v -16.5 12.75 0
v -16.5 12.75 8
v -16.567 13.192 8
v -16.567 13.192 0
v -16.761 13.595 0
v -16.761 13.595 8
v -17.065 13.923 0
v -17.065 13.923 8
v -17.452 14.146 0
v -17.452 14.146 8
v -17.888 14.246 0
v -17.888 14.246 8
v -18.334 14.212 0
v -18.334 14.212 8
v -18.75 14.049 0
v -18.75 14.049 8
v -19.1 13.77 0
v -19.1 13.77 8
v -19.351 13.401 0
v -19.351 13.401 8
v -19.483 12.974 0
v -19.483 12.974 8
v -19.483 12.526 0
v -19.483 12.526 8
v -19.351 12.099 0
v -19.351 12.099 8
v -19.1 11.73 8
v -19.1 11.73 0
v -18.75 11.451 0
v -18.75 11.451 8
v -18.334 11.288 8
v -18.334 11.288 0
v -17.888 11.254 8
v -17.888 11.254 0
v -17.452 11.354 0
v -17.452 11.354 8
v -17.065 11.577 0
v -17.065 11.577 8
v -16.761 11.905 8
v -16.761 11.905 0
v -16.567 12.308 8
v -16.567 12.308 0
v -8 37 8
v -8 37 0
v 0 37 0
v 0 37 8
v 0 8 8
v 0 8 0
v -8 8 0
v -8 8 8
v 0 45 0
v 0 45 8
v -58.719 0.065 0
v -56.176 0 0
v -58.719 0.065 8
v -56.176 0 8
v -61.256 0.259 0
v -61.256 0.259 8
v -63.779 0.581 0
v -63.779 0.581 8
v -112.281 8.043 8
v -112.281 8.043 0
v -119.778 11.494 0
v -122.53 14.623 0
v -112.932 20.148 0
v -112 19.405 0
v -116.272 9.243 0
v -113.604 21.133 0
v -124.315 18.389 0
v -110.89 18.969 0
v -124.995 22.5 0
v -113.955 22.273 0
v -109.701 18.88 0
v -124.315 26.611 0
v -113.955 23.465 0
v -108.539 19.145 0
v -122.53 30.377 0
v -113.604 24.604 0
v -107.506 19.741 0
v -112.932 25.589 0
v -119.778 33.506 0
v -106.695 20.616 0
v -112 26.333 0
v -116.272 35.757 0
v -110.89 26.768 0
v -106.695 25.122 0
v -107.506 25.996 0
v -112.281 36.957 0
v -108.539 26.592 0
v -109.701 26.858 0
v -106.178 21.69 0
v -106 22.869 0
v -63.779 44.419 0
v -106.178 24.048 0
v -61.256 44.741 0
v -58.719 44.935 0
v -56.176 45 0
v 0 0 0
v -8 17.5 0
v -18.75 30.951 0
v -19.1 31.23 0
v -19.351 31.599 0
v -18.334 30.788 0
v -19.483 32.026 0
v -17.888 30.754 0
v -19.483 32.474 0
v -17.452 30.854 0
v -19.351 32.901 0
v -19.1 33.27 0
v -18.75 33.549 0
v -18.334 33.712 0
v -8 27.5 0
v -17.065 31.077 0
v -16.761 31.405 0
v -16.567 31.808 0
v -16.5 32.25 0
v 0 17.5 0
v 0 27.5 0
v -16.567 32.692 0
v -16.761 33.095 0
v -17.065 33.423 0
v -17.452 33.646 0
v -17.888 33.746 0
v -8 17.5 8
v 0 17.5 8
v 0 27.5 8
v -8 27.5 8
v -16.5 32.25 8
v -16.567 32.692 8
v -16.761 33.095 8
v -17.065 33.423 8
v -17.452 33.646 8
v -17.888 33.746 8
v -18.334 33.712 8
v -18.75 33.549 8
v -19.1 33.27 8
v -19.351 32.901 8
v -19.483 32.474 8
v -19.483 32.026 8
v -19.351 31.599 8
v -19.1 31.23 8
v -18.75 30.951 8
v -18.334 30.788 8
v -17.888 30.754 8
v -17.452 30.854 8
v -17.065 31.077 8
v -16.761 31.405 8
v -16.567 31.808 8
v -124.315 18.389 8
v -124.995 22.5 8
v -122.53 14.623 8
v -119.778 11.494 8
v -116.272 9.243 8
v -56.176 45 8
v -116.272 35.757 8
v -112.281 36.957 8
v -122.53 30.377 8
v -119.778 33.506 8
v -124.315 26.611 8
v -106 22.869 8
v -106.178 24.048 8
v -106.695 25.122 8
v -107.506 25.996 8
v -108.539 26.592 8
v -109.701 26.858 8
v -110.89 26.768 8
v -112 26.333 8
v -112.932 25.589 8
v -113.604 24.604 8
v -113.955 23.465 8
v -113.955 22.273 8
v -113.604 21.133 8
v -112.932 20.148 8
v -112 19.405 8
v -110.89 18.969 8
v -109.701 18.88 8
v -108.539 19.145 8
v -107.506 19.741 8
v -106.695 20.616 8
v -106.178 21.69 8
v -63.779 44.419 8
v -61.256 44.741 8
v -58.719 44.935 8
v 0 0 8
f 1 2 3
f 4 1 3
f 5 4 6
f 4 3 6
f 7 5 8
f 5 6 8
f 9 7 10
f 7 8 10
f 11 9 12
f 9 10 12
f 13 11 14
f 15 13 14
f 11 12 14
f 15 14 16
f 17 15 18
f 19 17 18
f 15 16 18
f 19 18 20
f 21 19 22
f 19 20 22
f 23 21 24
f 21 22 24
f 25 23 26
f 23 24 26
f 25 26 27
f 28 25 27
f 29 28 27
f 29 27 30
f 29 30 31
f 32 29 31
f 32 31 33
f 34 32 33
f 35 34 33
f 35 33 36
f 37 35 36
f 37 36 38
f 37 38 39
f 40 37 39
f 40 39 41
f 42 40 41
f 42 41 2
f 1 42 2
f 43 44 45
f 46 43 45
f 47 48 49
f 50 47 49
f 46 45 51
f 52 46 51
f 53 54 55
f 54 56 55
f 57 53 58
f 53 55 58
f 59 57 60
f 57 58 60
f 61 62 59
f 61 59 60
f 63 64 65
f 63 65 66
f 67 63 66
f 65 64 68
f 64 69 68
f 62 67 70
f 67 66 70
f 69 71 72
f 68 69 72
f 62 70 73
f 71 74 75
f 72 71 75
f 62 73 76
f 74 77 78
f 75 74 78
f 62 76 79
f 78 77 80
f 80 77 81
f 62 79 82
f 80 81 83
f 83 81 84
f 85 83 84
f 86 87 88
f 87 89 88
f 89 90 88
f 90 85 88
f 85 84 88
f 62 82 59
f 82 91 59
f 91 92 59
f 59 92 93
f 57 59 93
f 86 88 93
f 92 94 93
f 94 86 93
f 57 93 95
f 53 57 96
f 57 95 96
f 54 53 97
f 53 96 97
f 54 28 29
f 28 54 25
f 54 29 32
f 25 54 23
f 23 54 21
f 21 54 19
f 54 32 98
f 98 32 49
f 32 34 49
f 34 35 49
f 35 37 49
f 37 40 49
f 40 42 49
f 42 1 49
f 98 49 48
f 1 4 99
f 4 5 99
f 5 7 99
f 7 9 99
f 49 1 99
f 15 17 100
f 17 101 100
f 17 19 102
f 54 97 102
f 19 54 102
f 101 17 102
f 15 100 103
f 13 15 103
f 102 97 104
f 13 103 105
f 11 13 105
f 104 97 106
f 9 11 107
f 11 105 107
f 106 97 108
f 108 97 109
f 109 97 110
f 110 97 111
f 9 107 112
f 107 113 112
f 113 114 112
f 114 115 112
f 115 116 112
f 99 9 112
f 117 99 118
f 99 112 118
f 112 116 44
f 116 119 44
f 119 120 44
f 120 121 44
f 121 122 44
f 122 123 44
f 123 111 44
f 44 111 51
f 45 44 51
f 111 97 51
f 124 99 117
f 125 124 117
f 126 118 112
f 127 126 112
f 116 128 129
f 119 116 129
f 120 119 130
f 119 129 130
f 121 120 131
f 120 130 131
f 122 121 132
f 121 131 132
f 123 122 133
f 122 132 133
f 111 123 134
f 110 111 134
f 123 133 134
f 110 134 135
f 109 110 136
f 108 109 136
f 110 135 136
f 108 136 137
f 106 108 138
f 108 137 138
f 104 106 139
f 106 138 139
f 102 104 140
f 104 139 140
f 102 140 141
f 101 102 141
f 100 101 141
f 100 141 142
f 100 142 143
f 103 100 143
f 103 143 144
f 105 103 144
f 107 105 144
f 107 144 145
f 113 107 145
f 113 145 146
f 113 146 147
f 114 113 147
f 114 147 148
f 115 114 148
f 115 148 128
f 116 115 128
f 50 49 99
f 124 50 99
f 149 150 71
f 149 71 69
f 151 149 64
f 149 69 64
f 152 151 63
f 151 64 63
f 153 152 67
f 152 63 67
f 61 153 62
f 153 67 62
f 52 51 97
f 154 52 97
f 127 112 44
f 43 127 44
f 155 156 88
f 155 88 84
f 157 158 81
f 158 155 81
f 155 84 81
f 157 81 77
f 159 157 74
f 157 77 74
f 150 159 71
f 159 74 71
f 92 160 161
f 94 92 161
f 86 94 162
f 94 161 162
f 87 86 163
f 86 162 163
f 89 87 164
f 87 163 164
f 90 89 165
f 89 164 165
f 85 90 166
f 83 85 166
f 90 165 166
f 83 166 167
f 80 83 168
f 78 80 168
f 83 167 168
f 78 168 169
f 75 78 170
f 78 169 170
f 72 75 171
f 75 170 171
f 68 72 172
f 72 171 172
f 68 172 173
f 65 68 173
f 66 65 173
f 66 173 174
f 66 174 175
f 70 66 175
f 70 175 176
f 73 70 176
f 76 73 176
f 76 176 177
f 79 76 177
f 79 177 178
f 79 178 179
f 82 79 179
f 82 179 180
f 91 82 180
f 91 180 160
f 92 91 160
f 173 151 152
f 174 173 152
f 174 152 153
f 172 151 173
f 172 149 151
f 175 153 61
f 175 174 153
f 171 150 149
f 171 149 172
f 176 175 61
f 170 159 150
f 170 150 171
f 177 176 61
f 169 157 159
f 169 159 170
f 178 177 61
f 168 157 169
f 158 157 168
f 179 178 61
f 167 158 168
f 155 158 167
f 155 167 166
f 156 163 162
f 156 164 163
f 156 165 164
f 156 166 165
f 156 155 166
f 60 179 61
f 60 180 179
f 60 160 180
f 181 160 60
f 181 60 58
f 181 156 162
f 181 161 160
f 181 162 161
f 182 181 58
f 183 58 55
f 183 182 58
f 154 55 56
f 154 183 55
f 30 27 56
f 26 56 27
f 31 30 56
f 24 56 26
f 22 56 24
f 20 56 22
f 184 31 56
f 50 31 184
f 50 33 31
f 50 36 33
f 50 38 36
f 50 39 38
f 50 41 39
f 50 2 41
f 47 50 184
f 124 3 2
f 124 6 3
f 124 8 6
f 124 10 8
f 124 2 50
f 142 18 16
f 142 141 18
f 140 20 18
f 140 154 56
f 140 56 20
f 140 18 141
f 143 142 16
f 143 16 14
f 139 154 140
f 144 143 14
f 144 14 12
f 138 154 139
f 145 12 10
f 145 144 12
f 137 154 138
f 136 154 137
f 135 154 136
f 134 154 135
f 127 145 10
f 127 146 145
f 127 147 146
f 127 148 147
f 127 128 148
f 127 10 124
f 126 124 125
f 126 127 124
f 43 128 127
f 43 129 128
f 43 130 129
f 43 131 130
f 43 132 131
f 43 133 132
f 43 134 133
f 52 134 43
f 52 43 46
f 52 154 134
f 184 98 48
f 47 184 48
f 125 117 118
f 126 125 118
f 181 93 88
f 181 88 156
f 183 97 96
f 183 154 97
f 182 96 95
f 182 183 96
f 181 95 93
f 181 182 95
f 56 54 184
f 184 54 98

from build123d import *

# Parameters (mm, degrees)
BOSS_EXTRUDE1_DEPTH = 8
CHAMFER1_SIZE       = 10
CHAMFER1_SIZE2      = 65
CHAMFER2_SIZE       = 65
CHAMFER2_SIZE2      = 10
FILLET2_R           = 15
FILLET3_R           = 50
SKETCH2_R           = 4
CUT_EXTRUDE1_DEPTH  = 80
SKETCH4_R           = 1.5
CUT_EXTRUDE3_DEPTH  = 15


with BuildPart() as part:
    # Sketch1 → Boss-Extrude1 (new body)
    with BuildSketch(Plane.XY):
        Polygon((0, 17.5), (0, 27.5), (-8, 27.5), (-8, 37), (0, 37), (0, 45), (-125, 45), (-125, 22.5), (-125, 0), (0, 0), (0, 8), (-8, 8), (-8, 17.5), align=None)
    extrude(amount=BOSS_EXTRUDE1_DEPTH)

    # Chamfer1
    chamfer1_edges = [part.edges().sort_by_distance(p)[0] for p in [
        (-125, 0, 4),
    ]]
    chamfer1_side = [part.faces().sort_by_distance(p)[0] for p in [
        (-125, 22.5, 4),
    ]]
    chamfer(chamfer1_edges, length=CHAMFER1_SIZE, length2=CHAMFER1_SIZE2, reference=chamfer1_side[0])

    # Chamfer2
    chamfer2_edges = [part.edges().sort_by_distance(p)[0] for p in [
        (-125, 45, 4),
    ]]
    chamfer2_side = [part.faces().sort_by_distance(p)[0] for p in [
        (-62.5, 45, 4),
    ]]
    chamfer(chamfer2_edges, length=CHAMFER2_SIZE, length2=CHAMFER2_SIZE2, reference=chamfer2_side[0])

    # Fillet2
    # the kernel refuses this fillet: 15 mm, written as the material it takes off along each edge
    with BuildSketch(Plane(origin=(-125, 10, -32.171960879), x_dir=(0, 1, 0), z_dir=(0, 0, 1))) as fillet2_piece_1:
        with BuildLine():
            CenterArc((FILLET2_R * 0.857918956767, -FILLET2_R), FILLET2_R, 90, 81.253837737)
            Line((-FILLET2_R * 0.130452740884, -FILLET2_R * 0.847942815746), (0, 0))
            Line((0, 0), (FILLET2_R * 0.857918956767, 0))
        make_face()
    extrude(amount=72.343921757, mode=Mode.SUBTRACT)
    with BuildSketch(Plane(origin=(-125, 35, -32.171960879), x_dir=(0, -1, 0), z_dir=(0, 0, 1))) as fillet2_piece_2:
        with BuildLine():
            CenterArc((FILLET2_R * 0.857918956767, FILLET2_R), FILLET2_R, 188.746162263, 81.253837737)
            Line((-FILLET2_R * 0.130452740884, FILLET2_R * 0.847942815746), (0, 0))
            Line((0, 0), (FILLET2_R * 0.857918956767, 0))
        make_face()
    extrude(amount=72.343921757, mode=Mode.SUBTRACT)

    # Fillet3
    fillet3_edges = [part.edges().sort_by_distance(p)[0] for p in [
        (-60, 0, 4),
        (-60, 45, 4),
    ]]
    fillet(fillet3_edges, radius=FILLET3_R)

    # Sketch2 → Cut-Extrude1 (cut)
    with BuildSketch(Plane.XY.offset(8)):
        with Locations((-110, 22.868784351)):
            Circle(SKETCH2_R)
    extrude(amount=-CUT_EXTRUDE1_DEPTH, mode=Mode.SUBTRACT)

    # Sketch4 → Cut-Extrude3 (cut)
    with BuildSketch(Plane.XY.offset(8)):
        with Locations((-18, 32.25)):
            Circle(SKETCH4_R)
        with Locations((-18, 12.75)):
            Circle(SKETCH4_R)
    extrude(amount=-CUT_EXTRUDE3_DEPTH, mode=Mode.SUBTRACT)


solid = part.part
